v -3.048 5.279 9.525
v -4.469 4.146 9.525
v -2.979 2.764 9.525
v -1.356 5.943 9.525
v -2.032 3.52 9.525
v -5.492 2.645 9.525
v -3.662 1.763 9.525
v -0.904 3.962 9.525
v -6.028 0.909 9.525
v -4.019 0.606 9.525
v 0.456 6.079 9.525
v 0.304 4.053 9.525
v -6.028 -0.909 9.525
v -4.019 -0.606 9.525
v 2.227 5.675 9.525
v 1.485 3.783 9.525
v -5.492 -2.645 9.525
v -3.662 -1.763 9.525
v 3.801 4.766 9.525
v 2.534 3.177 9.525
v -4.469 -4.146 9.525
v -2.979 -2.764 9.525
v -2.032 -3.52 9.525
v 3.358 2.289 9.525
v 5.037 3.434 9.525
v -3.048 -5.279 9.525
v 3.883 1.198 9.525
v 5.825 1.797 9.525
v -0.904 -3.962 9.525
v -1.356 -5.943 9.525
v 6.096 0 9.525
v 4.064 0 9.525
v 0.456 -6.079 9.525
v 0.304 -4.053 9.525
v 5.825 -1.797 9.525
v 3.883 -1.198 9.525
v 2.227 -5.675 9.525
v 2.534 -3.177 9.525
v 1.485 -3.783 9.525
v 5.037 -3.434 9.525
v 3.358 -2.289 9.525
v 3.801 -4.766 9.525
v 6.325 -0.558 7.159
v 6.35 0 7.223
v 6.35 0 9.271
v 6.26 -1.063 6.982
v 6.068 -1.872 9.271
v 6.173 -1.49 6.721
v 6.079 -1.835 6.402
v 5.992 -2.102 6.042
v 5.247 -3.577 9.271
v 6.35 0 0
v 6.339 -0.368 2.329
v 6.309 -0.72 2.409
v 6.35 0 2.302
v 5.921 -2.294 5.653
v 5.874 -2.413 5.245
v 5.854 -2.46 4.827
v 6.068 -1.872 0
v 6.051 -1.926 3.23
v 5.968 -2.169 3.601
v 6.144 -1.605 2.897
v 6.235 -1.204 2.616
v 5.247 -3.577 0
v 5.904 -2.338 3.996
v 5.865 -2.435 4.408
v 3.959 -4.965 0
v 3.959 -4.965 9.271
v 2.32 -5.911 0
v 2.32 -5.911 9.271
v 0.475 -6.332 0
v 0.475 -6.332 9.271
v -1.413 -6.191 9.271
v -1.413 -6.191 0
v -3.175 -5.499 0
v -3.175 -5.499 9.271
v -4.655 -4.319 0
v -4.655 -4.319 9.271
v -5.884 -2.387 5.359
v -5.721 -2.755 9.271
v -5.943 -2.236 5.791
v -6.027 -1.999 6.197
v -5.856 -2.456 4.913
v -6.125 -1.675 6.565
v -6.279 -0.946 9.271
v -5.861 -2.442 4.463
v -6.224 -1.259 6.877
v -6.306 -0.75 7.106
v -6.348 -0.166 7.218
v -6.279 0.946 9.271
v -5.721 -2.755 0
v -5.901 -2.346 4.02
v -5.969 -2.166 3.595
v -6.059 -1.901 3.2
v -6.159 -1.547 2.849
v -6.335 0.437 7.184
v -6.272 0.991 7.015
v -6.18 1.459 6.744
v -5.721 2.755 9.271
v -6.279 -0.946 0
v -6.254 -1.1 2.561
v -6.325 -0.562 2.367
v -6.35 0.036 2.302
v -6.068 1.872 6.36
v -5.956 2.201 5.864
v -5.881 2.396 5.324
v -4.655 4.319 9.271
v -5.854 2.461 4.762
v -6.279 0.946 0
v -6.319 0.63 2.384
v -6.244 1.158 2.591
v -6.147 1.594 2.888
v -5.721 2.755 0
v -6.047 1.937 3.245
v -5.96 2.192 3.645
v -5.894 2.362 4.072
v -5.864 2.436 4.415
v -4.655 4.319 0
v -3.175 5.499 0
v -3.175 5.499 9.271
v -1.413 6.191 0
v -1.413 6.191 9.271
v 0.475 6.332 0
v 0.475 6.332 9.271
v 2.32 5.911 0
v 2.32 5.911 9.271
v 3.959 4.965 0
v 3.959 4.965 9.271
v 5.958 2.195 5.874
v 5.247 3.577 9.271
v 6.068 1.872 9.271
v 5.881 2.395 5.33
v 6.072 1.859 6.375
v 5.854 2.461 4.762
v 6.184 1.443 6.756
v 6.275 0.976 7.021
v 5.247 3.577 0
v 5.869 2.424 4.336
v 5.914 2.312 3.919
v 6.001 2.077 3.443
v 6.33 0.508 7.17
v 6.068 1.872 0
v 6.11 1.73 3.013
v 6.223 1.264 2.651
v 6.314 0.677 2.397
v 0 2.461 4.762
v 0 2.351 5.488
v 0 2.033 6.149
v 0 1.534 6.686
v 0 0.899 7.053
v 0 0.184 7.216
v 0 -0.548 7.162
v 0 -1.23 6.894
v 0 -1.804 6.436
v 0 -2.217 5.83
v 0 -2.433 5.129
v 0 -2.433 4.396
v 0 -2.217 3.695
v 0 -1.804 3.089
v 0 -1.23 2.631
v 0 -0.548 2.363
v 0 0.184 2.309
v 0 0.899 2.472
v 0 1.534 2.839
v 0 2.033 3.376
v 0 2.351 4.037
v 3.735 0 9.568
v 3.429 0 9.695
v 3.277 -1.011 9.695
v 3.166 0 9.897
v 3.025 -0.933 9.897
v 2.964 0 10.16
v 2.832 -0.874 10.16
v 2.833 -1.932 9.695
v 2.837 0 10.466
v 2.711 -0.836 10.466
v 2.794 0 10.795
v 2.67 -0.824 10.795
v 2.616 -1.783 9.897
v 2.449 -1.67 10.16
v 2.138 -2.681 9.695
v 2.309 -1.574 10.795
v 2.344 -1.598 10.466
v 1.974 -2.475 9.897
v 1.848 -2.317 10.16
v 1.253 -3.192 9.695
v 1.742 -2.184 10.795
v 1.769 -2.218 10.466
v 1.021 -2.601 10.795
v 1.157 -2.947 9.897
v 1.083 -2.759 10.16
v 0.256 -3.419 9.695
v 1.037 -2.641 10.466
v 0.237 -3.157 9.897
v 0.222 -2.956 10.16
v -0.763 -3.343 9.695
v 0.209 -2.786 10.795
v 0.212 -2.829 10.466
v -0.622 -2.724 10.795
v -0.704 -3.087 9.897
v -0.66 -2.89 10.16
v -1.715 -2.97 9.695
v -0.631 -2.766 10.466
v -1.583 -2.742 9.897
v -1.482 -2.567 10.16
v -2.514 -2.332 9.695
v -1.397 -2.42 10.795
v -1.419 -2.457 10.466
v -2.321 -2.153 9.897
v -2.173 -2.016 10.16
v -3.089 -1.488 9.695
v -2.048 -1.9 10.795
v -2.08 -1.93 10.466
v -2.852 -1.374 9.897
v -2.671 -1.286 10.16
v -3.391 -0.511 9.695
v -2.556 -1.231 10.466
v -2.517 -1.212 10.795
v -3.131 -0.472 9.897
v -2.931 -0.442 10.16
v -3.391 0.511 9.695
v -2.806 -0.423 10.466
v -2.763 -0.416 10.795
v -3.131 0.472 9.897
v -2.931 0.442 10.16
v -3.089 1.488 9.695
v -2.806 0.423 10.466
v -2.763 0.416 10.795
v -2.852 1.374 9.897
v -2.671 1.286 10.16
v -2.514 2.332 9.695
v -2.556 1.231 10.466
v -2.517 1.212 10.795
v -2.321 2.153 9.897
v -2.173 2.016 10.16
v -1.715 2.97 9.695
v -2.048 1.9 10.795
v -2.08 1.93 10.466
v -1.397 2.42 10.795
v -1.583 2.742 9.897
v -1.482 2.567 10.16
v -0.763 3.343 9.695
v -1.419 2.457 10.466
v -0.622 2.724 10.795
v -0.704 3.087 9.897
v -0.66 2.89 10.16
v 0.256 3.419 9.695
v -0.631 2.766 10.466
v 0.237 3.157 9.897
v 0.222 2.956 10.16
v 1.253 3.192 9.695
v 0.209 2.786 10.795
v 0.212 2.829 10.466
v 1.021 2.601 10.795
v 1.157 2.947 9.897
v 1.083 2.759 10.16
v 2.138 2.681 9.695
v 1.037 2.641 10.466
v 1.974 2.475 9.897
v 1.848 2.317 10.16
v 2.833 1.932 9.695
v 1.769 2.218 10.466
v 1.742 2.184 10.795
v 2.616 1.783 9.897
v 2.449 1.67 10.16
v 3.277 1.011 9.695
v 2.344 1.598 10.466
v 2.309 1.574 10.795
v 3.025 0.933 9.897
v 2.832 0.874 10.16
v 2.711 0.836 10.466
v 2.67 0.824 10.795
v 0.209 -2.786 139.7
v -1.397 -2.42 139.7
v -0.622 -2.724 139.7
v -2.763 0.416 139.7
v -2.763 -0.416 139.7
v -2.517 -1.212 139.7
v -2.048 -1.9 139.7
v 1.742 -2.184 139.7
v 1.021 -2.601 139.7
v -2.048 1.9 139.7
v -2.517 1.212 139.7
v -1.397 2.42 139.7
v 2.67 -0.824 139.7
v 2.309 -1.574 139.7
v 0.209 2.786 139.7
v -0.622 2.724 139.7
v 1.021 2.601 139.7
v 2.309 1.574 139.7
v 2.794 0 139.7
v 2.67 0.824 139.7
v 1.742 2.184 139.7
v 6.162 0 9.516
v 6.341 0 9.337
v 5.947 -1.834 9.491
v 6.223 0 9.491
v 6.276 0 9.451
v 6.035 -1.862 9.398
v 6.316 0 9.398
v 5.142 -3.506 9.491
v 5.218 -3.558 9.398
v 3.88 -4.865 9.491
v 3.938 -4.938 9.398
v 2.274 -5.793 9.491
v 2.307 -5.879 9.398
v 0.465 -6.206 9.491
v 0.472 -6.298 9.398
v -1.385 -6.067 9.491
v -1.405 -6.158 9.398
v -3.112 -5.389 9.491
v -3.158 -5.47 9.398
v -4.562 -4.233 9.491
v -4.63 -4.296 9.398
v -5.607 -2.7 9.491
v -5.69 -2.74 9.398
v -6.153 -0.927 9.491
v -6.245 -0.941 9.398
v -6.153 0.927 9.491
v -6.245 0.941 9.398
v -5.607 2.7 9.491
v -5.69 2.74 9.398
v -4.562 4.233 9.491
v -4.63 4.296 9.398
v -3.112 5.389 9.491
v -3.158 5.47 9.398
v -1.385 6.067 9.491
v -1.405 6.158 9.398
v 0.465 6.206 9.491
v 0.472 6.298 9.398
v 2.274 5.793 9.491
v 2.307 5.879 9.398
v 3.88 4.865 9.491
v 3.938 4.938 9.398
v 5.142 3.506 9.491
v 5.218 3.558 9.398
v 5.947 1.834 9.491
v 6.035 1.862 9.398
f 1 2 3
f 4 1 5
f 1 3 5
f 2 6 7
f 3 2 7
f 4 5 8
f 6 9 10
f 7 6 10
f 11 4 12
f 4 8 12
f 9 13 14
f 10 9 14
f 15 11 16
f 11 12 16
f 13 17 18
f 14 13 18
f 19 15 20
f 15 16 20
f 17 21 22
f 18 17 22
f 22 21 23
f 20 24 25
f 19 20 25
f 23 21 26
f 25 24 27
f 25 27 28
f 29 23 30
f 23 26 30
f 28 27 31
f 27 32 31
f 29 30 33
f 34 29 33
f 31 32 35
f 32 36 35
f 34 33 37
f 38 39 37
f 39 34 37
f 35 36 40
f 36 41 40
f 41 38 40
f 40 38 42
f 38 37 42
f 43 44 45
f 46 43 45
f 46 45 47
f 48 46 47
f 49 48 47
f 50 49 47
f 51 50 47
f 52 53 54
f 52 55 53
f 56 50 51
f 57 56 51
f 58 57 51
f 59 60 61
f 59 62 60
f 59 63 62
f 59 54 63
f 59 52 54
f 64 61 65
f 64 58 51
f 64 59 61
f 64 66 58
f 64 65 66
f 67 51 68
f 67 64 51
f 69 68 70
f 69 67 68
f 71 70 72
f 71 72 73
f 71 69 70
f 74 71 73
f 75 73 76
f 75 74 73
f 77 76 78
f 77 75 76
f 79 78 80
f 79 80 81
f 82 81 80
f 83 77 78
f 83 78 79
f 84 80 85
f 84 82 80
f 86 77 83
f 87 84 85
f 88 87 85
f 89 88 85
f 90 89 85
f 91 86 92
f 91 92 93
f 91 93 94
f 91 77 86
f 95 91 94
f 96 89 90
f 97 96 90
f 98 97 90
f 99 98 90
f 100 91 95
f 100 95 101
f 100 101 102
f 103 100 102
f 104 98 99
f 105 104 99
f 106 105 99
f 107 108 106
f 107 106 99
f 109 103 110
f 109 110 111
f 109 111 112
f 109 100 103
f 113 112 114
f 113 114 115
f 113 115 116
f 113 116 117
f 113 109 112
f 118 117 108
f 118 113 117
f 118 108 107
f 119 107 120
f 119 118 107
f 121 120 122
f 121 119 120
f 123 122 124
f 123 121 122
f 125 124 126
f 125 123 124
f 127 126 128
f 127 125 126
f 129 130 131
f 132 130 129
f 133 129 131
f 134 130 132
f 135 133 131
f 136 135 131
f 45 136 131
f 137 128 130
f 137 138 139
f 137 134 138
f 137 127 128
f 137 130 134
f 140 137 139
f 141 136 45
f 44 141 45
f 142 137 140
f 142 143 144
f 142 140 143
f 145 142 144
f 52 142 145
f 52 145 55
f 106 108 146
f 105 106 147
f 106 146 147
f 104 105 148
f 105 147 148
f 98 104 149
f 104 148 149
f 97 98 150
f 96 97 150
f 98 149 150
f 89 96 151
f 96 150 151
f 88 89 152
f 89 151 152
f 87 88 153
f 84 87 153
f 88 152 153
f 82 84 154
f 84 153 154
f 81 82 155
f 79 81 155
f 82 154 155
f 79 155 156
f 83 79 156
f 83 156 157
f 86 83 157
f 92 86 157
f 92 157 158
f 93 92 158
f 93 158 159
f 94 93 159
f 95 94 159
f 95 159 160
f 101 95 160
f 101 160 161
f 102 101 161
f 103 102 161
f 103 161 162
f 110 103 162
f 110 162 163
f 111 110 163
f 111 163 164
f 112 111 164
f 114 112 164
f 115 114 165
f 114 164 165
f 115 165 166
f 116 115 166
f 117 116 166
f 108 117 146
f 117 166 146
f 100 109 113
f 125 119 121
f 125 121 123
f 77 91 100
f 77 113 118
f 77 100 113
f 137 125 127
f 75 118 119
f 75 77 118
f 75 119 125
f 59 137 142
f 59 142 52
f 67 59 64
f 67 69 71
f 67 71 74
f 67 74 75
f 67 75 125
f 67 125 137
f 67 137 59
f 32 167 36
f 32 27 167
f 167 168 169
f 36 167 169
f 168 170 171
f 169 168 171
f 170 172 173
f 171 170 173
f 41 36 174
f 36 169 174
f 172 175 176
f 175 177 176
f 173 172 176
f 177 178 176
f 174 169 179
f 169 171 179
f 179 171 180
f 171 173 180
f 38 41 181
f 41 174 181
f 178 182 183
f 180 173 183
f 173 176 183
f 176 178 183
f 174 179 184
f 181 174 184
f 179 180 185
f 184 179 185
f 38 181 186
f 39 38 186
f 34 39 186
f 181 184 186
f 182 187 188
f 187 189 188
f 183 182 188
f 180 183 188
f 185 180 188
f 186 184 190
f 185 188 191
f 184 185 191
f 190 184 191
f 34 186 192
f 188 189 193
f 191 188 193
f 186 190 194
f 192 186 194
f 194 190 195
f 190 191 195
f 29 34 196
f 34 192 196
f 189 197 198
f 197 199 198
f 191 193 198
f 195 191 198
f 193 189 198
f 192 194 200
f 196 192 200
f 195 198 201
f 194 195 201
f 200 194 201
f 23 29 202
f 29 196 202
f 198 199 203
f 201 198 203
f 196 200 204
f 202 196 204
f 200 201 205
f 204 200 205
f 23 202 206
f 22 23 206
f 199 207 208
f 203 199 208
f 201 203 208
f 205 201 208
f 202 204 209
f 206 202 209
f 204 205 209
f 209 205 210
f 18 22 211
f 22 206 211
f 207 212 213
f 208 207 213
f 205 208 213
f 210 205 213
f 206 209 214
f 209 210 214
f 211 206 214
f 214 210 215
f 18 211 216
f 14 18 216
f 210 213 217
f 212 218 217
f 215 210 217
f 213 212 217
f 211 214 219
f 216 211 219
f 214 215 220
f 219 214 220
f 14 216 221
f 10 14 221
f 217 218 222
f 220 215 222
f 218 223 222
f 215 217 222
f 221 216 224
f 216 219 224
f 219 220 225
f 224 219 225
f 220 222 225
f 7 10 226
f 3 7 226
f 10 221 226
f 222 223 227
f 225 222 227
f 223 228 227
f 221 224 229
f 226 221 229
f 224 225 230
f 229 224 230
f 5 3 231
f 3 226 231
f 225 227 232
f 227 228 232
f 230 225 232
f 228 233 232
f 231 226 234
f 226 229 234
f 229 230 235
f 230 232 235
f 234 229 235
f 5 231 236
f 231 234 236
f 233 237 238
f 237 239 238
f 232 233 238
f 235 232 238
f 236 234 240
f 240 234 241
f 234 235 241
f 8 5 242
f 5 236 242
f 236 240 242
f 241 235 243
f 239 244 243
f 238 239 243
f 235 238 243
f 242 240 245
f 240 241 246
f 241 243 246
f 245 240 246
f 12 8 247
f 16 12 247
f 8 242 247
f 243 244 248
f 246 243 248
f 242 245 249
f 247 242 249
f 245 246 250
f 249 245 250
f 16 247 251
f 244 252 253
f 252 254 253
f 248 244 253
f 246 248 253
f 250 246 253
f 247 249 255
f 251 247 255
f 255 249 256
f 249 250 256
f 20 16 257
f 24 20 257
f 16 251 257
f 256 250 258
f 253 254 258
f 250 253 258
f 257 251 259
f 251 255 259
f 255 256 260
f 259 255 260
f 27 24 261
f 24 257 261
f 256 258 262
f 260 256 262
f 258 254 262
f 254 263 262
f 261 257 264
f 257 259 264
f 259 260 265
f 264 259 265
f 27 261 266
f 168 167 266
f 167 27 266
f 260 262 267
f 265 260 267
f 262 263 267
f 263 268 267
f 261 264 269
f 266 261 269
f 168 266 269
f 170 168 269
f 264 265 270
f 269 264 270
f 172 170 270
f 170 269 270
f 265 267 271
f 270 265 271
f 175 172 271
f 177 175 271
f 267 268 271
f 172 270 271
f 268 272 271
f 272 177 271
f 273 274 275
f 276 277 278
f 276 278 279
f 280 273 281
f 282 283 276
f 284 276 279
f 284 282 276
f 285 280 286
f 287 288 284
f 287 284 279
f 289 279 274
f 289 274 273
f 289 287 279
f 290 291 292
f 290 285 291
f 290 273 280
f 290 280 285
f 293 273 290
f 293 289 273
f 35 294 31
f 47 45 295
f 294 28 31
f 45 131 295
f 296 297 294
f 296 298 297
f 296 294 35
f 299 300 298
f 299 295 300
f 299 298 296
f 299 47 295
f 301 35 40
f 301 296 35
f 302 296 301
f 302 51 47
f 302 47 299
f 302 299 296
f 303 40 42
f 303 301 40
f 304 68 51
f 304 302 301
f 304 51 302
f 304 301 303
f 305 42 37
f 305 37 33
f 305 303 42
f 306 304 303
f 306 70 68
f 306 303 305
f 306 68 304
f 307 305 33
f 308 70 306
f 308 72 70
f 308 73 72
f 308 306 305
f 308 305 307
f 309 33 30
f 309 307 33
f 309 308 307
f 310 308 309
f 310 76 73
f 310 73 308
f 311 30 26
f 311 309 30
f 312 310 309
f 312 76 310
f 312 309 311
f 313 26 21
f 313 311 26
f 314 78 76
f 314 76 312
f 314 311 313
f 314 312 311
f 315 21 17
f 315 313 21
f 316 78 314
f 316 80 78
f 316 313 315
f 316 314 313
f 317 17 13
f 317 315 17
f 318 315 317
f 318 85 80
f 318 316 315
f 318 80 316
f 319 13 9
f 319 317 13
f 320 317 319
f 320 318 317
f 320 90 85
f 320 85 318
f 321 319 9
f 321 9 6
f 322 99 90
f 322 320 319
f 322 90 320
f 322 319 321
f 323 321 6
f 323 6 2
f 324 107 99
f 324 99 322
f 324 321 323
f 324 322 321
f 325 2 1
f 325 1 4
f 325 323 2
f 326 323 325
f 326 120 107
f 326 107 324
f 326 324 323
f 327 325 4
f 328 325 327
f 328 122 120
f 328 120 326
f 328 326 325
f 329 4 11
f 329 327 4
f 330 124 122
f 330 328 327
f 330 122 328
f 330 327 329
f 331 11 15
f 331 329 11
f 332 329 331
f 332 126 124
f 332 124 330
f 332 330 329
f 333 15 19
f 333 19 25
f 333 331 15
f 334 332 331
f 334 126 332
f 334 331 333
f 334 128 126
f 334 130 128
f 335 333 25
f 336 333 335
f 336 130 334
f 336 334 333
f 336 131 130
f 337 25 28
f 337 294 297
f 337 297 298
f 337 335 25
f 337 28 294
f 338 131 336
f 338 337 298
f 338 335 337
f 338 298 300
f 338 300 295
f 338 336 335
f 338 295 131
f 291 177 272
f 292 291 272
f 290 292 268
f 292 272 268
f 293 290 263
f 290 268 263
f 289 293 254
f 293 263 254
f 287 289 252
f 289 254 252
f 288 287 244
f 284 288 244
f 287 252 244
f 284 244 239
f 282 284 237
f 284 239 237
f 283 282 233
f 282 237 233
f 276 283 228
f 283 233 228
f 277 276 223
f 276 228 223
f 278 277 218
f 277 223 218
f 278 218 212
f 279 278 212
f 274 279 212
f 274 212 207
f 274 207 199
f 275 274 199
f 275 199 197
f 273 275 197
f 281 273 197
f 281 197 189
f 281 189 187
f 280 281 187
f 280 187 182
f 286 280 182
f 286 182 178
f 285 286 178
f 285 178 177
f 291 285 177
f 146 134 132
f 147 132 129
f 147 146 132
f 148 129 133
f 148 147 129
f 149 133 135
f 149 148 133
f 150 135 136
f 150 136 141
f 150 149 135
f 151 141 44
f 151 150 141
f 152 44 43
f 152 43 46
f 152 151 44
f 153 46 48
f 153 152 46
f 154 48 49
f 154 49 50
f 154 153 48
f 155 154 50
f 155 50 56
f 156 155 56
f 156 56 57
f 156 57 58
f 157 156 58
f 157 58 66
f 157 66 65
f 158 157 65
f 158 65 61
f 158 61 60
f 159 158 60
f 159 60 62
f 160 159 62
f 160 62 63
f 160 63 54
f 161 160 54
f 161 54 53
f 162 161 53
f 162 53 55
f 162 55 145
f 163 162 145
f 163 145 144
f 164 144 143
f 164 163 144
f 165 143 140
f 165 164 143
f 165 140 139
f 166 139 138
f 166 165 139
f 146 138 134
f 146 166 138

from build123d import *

# Parameters (mm, degrees)
F0_R     = 2.794
F1_DEPTH = 139.7
F2_R     = 6.35
F3_DEPTH = 9.525
F4_R     = 1.27
F5_R     = 0.254
F6_R     = 2.460798
F7_DEPTH = 25.4
F8_DEPTH = 25.4


with BuildPart() as f1:
    # F0 (on Top) → F1 (new body)
    with BuildSketch(Plane.XY):
        Circle(F0_R)
    extrude(amount=F1_DEPTH)

    # F2 (on face) → F3 (join)
    with BuildSketch(Plane(origin=(0, 0, 0), x_dir=(1, 0, 0), z_dir=(0, 0, -1))):
        Circle(F2_R)
    extrude(amount=-F3_DEPTH)

    # F4
    f4_edges = [f1.edges().sort_by_distance(p)[0] for p in [
        (-2.794, 0, 9.525),
    ]]
    fillet(f4_edges, radius=F4_R)

    # F5
    f5_edges = [f1.edges().sort_by_distance(p)[0] for p in [
        (-6.35, 0, 9.525),
    ]]
    fillet(f5_edges, radius=F5_R)

    # F6 (on Right) → F7 (cut)
    with BuildSketch(Plane.YZ):
        with Locations((0, 4.7625)):
            Circle(F6_R)
    extrude(amount=-F7_DEPTH, mode=Mode.SUBTRACT)

    # F6 (on Right) → F8 (cut)
    with BuildSketch(Plane.YZ):
        with Locations((0, 4.7625)):
            Circle(F6_R)
    extrude(amount=F8_DEPTH, mode=Mode.SUBTRACT)


solid = f1.part
